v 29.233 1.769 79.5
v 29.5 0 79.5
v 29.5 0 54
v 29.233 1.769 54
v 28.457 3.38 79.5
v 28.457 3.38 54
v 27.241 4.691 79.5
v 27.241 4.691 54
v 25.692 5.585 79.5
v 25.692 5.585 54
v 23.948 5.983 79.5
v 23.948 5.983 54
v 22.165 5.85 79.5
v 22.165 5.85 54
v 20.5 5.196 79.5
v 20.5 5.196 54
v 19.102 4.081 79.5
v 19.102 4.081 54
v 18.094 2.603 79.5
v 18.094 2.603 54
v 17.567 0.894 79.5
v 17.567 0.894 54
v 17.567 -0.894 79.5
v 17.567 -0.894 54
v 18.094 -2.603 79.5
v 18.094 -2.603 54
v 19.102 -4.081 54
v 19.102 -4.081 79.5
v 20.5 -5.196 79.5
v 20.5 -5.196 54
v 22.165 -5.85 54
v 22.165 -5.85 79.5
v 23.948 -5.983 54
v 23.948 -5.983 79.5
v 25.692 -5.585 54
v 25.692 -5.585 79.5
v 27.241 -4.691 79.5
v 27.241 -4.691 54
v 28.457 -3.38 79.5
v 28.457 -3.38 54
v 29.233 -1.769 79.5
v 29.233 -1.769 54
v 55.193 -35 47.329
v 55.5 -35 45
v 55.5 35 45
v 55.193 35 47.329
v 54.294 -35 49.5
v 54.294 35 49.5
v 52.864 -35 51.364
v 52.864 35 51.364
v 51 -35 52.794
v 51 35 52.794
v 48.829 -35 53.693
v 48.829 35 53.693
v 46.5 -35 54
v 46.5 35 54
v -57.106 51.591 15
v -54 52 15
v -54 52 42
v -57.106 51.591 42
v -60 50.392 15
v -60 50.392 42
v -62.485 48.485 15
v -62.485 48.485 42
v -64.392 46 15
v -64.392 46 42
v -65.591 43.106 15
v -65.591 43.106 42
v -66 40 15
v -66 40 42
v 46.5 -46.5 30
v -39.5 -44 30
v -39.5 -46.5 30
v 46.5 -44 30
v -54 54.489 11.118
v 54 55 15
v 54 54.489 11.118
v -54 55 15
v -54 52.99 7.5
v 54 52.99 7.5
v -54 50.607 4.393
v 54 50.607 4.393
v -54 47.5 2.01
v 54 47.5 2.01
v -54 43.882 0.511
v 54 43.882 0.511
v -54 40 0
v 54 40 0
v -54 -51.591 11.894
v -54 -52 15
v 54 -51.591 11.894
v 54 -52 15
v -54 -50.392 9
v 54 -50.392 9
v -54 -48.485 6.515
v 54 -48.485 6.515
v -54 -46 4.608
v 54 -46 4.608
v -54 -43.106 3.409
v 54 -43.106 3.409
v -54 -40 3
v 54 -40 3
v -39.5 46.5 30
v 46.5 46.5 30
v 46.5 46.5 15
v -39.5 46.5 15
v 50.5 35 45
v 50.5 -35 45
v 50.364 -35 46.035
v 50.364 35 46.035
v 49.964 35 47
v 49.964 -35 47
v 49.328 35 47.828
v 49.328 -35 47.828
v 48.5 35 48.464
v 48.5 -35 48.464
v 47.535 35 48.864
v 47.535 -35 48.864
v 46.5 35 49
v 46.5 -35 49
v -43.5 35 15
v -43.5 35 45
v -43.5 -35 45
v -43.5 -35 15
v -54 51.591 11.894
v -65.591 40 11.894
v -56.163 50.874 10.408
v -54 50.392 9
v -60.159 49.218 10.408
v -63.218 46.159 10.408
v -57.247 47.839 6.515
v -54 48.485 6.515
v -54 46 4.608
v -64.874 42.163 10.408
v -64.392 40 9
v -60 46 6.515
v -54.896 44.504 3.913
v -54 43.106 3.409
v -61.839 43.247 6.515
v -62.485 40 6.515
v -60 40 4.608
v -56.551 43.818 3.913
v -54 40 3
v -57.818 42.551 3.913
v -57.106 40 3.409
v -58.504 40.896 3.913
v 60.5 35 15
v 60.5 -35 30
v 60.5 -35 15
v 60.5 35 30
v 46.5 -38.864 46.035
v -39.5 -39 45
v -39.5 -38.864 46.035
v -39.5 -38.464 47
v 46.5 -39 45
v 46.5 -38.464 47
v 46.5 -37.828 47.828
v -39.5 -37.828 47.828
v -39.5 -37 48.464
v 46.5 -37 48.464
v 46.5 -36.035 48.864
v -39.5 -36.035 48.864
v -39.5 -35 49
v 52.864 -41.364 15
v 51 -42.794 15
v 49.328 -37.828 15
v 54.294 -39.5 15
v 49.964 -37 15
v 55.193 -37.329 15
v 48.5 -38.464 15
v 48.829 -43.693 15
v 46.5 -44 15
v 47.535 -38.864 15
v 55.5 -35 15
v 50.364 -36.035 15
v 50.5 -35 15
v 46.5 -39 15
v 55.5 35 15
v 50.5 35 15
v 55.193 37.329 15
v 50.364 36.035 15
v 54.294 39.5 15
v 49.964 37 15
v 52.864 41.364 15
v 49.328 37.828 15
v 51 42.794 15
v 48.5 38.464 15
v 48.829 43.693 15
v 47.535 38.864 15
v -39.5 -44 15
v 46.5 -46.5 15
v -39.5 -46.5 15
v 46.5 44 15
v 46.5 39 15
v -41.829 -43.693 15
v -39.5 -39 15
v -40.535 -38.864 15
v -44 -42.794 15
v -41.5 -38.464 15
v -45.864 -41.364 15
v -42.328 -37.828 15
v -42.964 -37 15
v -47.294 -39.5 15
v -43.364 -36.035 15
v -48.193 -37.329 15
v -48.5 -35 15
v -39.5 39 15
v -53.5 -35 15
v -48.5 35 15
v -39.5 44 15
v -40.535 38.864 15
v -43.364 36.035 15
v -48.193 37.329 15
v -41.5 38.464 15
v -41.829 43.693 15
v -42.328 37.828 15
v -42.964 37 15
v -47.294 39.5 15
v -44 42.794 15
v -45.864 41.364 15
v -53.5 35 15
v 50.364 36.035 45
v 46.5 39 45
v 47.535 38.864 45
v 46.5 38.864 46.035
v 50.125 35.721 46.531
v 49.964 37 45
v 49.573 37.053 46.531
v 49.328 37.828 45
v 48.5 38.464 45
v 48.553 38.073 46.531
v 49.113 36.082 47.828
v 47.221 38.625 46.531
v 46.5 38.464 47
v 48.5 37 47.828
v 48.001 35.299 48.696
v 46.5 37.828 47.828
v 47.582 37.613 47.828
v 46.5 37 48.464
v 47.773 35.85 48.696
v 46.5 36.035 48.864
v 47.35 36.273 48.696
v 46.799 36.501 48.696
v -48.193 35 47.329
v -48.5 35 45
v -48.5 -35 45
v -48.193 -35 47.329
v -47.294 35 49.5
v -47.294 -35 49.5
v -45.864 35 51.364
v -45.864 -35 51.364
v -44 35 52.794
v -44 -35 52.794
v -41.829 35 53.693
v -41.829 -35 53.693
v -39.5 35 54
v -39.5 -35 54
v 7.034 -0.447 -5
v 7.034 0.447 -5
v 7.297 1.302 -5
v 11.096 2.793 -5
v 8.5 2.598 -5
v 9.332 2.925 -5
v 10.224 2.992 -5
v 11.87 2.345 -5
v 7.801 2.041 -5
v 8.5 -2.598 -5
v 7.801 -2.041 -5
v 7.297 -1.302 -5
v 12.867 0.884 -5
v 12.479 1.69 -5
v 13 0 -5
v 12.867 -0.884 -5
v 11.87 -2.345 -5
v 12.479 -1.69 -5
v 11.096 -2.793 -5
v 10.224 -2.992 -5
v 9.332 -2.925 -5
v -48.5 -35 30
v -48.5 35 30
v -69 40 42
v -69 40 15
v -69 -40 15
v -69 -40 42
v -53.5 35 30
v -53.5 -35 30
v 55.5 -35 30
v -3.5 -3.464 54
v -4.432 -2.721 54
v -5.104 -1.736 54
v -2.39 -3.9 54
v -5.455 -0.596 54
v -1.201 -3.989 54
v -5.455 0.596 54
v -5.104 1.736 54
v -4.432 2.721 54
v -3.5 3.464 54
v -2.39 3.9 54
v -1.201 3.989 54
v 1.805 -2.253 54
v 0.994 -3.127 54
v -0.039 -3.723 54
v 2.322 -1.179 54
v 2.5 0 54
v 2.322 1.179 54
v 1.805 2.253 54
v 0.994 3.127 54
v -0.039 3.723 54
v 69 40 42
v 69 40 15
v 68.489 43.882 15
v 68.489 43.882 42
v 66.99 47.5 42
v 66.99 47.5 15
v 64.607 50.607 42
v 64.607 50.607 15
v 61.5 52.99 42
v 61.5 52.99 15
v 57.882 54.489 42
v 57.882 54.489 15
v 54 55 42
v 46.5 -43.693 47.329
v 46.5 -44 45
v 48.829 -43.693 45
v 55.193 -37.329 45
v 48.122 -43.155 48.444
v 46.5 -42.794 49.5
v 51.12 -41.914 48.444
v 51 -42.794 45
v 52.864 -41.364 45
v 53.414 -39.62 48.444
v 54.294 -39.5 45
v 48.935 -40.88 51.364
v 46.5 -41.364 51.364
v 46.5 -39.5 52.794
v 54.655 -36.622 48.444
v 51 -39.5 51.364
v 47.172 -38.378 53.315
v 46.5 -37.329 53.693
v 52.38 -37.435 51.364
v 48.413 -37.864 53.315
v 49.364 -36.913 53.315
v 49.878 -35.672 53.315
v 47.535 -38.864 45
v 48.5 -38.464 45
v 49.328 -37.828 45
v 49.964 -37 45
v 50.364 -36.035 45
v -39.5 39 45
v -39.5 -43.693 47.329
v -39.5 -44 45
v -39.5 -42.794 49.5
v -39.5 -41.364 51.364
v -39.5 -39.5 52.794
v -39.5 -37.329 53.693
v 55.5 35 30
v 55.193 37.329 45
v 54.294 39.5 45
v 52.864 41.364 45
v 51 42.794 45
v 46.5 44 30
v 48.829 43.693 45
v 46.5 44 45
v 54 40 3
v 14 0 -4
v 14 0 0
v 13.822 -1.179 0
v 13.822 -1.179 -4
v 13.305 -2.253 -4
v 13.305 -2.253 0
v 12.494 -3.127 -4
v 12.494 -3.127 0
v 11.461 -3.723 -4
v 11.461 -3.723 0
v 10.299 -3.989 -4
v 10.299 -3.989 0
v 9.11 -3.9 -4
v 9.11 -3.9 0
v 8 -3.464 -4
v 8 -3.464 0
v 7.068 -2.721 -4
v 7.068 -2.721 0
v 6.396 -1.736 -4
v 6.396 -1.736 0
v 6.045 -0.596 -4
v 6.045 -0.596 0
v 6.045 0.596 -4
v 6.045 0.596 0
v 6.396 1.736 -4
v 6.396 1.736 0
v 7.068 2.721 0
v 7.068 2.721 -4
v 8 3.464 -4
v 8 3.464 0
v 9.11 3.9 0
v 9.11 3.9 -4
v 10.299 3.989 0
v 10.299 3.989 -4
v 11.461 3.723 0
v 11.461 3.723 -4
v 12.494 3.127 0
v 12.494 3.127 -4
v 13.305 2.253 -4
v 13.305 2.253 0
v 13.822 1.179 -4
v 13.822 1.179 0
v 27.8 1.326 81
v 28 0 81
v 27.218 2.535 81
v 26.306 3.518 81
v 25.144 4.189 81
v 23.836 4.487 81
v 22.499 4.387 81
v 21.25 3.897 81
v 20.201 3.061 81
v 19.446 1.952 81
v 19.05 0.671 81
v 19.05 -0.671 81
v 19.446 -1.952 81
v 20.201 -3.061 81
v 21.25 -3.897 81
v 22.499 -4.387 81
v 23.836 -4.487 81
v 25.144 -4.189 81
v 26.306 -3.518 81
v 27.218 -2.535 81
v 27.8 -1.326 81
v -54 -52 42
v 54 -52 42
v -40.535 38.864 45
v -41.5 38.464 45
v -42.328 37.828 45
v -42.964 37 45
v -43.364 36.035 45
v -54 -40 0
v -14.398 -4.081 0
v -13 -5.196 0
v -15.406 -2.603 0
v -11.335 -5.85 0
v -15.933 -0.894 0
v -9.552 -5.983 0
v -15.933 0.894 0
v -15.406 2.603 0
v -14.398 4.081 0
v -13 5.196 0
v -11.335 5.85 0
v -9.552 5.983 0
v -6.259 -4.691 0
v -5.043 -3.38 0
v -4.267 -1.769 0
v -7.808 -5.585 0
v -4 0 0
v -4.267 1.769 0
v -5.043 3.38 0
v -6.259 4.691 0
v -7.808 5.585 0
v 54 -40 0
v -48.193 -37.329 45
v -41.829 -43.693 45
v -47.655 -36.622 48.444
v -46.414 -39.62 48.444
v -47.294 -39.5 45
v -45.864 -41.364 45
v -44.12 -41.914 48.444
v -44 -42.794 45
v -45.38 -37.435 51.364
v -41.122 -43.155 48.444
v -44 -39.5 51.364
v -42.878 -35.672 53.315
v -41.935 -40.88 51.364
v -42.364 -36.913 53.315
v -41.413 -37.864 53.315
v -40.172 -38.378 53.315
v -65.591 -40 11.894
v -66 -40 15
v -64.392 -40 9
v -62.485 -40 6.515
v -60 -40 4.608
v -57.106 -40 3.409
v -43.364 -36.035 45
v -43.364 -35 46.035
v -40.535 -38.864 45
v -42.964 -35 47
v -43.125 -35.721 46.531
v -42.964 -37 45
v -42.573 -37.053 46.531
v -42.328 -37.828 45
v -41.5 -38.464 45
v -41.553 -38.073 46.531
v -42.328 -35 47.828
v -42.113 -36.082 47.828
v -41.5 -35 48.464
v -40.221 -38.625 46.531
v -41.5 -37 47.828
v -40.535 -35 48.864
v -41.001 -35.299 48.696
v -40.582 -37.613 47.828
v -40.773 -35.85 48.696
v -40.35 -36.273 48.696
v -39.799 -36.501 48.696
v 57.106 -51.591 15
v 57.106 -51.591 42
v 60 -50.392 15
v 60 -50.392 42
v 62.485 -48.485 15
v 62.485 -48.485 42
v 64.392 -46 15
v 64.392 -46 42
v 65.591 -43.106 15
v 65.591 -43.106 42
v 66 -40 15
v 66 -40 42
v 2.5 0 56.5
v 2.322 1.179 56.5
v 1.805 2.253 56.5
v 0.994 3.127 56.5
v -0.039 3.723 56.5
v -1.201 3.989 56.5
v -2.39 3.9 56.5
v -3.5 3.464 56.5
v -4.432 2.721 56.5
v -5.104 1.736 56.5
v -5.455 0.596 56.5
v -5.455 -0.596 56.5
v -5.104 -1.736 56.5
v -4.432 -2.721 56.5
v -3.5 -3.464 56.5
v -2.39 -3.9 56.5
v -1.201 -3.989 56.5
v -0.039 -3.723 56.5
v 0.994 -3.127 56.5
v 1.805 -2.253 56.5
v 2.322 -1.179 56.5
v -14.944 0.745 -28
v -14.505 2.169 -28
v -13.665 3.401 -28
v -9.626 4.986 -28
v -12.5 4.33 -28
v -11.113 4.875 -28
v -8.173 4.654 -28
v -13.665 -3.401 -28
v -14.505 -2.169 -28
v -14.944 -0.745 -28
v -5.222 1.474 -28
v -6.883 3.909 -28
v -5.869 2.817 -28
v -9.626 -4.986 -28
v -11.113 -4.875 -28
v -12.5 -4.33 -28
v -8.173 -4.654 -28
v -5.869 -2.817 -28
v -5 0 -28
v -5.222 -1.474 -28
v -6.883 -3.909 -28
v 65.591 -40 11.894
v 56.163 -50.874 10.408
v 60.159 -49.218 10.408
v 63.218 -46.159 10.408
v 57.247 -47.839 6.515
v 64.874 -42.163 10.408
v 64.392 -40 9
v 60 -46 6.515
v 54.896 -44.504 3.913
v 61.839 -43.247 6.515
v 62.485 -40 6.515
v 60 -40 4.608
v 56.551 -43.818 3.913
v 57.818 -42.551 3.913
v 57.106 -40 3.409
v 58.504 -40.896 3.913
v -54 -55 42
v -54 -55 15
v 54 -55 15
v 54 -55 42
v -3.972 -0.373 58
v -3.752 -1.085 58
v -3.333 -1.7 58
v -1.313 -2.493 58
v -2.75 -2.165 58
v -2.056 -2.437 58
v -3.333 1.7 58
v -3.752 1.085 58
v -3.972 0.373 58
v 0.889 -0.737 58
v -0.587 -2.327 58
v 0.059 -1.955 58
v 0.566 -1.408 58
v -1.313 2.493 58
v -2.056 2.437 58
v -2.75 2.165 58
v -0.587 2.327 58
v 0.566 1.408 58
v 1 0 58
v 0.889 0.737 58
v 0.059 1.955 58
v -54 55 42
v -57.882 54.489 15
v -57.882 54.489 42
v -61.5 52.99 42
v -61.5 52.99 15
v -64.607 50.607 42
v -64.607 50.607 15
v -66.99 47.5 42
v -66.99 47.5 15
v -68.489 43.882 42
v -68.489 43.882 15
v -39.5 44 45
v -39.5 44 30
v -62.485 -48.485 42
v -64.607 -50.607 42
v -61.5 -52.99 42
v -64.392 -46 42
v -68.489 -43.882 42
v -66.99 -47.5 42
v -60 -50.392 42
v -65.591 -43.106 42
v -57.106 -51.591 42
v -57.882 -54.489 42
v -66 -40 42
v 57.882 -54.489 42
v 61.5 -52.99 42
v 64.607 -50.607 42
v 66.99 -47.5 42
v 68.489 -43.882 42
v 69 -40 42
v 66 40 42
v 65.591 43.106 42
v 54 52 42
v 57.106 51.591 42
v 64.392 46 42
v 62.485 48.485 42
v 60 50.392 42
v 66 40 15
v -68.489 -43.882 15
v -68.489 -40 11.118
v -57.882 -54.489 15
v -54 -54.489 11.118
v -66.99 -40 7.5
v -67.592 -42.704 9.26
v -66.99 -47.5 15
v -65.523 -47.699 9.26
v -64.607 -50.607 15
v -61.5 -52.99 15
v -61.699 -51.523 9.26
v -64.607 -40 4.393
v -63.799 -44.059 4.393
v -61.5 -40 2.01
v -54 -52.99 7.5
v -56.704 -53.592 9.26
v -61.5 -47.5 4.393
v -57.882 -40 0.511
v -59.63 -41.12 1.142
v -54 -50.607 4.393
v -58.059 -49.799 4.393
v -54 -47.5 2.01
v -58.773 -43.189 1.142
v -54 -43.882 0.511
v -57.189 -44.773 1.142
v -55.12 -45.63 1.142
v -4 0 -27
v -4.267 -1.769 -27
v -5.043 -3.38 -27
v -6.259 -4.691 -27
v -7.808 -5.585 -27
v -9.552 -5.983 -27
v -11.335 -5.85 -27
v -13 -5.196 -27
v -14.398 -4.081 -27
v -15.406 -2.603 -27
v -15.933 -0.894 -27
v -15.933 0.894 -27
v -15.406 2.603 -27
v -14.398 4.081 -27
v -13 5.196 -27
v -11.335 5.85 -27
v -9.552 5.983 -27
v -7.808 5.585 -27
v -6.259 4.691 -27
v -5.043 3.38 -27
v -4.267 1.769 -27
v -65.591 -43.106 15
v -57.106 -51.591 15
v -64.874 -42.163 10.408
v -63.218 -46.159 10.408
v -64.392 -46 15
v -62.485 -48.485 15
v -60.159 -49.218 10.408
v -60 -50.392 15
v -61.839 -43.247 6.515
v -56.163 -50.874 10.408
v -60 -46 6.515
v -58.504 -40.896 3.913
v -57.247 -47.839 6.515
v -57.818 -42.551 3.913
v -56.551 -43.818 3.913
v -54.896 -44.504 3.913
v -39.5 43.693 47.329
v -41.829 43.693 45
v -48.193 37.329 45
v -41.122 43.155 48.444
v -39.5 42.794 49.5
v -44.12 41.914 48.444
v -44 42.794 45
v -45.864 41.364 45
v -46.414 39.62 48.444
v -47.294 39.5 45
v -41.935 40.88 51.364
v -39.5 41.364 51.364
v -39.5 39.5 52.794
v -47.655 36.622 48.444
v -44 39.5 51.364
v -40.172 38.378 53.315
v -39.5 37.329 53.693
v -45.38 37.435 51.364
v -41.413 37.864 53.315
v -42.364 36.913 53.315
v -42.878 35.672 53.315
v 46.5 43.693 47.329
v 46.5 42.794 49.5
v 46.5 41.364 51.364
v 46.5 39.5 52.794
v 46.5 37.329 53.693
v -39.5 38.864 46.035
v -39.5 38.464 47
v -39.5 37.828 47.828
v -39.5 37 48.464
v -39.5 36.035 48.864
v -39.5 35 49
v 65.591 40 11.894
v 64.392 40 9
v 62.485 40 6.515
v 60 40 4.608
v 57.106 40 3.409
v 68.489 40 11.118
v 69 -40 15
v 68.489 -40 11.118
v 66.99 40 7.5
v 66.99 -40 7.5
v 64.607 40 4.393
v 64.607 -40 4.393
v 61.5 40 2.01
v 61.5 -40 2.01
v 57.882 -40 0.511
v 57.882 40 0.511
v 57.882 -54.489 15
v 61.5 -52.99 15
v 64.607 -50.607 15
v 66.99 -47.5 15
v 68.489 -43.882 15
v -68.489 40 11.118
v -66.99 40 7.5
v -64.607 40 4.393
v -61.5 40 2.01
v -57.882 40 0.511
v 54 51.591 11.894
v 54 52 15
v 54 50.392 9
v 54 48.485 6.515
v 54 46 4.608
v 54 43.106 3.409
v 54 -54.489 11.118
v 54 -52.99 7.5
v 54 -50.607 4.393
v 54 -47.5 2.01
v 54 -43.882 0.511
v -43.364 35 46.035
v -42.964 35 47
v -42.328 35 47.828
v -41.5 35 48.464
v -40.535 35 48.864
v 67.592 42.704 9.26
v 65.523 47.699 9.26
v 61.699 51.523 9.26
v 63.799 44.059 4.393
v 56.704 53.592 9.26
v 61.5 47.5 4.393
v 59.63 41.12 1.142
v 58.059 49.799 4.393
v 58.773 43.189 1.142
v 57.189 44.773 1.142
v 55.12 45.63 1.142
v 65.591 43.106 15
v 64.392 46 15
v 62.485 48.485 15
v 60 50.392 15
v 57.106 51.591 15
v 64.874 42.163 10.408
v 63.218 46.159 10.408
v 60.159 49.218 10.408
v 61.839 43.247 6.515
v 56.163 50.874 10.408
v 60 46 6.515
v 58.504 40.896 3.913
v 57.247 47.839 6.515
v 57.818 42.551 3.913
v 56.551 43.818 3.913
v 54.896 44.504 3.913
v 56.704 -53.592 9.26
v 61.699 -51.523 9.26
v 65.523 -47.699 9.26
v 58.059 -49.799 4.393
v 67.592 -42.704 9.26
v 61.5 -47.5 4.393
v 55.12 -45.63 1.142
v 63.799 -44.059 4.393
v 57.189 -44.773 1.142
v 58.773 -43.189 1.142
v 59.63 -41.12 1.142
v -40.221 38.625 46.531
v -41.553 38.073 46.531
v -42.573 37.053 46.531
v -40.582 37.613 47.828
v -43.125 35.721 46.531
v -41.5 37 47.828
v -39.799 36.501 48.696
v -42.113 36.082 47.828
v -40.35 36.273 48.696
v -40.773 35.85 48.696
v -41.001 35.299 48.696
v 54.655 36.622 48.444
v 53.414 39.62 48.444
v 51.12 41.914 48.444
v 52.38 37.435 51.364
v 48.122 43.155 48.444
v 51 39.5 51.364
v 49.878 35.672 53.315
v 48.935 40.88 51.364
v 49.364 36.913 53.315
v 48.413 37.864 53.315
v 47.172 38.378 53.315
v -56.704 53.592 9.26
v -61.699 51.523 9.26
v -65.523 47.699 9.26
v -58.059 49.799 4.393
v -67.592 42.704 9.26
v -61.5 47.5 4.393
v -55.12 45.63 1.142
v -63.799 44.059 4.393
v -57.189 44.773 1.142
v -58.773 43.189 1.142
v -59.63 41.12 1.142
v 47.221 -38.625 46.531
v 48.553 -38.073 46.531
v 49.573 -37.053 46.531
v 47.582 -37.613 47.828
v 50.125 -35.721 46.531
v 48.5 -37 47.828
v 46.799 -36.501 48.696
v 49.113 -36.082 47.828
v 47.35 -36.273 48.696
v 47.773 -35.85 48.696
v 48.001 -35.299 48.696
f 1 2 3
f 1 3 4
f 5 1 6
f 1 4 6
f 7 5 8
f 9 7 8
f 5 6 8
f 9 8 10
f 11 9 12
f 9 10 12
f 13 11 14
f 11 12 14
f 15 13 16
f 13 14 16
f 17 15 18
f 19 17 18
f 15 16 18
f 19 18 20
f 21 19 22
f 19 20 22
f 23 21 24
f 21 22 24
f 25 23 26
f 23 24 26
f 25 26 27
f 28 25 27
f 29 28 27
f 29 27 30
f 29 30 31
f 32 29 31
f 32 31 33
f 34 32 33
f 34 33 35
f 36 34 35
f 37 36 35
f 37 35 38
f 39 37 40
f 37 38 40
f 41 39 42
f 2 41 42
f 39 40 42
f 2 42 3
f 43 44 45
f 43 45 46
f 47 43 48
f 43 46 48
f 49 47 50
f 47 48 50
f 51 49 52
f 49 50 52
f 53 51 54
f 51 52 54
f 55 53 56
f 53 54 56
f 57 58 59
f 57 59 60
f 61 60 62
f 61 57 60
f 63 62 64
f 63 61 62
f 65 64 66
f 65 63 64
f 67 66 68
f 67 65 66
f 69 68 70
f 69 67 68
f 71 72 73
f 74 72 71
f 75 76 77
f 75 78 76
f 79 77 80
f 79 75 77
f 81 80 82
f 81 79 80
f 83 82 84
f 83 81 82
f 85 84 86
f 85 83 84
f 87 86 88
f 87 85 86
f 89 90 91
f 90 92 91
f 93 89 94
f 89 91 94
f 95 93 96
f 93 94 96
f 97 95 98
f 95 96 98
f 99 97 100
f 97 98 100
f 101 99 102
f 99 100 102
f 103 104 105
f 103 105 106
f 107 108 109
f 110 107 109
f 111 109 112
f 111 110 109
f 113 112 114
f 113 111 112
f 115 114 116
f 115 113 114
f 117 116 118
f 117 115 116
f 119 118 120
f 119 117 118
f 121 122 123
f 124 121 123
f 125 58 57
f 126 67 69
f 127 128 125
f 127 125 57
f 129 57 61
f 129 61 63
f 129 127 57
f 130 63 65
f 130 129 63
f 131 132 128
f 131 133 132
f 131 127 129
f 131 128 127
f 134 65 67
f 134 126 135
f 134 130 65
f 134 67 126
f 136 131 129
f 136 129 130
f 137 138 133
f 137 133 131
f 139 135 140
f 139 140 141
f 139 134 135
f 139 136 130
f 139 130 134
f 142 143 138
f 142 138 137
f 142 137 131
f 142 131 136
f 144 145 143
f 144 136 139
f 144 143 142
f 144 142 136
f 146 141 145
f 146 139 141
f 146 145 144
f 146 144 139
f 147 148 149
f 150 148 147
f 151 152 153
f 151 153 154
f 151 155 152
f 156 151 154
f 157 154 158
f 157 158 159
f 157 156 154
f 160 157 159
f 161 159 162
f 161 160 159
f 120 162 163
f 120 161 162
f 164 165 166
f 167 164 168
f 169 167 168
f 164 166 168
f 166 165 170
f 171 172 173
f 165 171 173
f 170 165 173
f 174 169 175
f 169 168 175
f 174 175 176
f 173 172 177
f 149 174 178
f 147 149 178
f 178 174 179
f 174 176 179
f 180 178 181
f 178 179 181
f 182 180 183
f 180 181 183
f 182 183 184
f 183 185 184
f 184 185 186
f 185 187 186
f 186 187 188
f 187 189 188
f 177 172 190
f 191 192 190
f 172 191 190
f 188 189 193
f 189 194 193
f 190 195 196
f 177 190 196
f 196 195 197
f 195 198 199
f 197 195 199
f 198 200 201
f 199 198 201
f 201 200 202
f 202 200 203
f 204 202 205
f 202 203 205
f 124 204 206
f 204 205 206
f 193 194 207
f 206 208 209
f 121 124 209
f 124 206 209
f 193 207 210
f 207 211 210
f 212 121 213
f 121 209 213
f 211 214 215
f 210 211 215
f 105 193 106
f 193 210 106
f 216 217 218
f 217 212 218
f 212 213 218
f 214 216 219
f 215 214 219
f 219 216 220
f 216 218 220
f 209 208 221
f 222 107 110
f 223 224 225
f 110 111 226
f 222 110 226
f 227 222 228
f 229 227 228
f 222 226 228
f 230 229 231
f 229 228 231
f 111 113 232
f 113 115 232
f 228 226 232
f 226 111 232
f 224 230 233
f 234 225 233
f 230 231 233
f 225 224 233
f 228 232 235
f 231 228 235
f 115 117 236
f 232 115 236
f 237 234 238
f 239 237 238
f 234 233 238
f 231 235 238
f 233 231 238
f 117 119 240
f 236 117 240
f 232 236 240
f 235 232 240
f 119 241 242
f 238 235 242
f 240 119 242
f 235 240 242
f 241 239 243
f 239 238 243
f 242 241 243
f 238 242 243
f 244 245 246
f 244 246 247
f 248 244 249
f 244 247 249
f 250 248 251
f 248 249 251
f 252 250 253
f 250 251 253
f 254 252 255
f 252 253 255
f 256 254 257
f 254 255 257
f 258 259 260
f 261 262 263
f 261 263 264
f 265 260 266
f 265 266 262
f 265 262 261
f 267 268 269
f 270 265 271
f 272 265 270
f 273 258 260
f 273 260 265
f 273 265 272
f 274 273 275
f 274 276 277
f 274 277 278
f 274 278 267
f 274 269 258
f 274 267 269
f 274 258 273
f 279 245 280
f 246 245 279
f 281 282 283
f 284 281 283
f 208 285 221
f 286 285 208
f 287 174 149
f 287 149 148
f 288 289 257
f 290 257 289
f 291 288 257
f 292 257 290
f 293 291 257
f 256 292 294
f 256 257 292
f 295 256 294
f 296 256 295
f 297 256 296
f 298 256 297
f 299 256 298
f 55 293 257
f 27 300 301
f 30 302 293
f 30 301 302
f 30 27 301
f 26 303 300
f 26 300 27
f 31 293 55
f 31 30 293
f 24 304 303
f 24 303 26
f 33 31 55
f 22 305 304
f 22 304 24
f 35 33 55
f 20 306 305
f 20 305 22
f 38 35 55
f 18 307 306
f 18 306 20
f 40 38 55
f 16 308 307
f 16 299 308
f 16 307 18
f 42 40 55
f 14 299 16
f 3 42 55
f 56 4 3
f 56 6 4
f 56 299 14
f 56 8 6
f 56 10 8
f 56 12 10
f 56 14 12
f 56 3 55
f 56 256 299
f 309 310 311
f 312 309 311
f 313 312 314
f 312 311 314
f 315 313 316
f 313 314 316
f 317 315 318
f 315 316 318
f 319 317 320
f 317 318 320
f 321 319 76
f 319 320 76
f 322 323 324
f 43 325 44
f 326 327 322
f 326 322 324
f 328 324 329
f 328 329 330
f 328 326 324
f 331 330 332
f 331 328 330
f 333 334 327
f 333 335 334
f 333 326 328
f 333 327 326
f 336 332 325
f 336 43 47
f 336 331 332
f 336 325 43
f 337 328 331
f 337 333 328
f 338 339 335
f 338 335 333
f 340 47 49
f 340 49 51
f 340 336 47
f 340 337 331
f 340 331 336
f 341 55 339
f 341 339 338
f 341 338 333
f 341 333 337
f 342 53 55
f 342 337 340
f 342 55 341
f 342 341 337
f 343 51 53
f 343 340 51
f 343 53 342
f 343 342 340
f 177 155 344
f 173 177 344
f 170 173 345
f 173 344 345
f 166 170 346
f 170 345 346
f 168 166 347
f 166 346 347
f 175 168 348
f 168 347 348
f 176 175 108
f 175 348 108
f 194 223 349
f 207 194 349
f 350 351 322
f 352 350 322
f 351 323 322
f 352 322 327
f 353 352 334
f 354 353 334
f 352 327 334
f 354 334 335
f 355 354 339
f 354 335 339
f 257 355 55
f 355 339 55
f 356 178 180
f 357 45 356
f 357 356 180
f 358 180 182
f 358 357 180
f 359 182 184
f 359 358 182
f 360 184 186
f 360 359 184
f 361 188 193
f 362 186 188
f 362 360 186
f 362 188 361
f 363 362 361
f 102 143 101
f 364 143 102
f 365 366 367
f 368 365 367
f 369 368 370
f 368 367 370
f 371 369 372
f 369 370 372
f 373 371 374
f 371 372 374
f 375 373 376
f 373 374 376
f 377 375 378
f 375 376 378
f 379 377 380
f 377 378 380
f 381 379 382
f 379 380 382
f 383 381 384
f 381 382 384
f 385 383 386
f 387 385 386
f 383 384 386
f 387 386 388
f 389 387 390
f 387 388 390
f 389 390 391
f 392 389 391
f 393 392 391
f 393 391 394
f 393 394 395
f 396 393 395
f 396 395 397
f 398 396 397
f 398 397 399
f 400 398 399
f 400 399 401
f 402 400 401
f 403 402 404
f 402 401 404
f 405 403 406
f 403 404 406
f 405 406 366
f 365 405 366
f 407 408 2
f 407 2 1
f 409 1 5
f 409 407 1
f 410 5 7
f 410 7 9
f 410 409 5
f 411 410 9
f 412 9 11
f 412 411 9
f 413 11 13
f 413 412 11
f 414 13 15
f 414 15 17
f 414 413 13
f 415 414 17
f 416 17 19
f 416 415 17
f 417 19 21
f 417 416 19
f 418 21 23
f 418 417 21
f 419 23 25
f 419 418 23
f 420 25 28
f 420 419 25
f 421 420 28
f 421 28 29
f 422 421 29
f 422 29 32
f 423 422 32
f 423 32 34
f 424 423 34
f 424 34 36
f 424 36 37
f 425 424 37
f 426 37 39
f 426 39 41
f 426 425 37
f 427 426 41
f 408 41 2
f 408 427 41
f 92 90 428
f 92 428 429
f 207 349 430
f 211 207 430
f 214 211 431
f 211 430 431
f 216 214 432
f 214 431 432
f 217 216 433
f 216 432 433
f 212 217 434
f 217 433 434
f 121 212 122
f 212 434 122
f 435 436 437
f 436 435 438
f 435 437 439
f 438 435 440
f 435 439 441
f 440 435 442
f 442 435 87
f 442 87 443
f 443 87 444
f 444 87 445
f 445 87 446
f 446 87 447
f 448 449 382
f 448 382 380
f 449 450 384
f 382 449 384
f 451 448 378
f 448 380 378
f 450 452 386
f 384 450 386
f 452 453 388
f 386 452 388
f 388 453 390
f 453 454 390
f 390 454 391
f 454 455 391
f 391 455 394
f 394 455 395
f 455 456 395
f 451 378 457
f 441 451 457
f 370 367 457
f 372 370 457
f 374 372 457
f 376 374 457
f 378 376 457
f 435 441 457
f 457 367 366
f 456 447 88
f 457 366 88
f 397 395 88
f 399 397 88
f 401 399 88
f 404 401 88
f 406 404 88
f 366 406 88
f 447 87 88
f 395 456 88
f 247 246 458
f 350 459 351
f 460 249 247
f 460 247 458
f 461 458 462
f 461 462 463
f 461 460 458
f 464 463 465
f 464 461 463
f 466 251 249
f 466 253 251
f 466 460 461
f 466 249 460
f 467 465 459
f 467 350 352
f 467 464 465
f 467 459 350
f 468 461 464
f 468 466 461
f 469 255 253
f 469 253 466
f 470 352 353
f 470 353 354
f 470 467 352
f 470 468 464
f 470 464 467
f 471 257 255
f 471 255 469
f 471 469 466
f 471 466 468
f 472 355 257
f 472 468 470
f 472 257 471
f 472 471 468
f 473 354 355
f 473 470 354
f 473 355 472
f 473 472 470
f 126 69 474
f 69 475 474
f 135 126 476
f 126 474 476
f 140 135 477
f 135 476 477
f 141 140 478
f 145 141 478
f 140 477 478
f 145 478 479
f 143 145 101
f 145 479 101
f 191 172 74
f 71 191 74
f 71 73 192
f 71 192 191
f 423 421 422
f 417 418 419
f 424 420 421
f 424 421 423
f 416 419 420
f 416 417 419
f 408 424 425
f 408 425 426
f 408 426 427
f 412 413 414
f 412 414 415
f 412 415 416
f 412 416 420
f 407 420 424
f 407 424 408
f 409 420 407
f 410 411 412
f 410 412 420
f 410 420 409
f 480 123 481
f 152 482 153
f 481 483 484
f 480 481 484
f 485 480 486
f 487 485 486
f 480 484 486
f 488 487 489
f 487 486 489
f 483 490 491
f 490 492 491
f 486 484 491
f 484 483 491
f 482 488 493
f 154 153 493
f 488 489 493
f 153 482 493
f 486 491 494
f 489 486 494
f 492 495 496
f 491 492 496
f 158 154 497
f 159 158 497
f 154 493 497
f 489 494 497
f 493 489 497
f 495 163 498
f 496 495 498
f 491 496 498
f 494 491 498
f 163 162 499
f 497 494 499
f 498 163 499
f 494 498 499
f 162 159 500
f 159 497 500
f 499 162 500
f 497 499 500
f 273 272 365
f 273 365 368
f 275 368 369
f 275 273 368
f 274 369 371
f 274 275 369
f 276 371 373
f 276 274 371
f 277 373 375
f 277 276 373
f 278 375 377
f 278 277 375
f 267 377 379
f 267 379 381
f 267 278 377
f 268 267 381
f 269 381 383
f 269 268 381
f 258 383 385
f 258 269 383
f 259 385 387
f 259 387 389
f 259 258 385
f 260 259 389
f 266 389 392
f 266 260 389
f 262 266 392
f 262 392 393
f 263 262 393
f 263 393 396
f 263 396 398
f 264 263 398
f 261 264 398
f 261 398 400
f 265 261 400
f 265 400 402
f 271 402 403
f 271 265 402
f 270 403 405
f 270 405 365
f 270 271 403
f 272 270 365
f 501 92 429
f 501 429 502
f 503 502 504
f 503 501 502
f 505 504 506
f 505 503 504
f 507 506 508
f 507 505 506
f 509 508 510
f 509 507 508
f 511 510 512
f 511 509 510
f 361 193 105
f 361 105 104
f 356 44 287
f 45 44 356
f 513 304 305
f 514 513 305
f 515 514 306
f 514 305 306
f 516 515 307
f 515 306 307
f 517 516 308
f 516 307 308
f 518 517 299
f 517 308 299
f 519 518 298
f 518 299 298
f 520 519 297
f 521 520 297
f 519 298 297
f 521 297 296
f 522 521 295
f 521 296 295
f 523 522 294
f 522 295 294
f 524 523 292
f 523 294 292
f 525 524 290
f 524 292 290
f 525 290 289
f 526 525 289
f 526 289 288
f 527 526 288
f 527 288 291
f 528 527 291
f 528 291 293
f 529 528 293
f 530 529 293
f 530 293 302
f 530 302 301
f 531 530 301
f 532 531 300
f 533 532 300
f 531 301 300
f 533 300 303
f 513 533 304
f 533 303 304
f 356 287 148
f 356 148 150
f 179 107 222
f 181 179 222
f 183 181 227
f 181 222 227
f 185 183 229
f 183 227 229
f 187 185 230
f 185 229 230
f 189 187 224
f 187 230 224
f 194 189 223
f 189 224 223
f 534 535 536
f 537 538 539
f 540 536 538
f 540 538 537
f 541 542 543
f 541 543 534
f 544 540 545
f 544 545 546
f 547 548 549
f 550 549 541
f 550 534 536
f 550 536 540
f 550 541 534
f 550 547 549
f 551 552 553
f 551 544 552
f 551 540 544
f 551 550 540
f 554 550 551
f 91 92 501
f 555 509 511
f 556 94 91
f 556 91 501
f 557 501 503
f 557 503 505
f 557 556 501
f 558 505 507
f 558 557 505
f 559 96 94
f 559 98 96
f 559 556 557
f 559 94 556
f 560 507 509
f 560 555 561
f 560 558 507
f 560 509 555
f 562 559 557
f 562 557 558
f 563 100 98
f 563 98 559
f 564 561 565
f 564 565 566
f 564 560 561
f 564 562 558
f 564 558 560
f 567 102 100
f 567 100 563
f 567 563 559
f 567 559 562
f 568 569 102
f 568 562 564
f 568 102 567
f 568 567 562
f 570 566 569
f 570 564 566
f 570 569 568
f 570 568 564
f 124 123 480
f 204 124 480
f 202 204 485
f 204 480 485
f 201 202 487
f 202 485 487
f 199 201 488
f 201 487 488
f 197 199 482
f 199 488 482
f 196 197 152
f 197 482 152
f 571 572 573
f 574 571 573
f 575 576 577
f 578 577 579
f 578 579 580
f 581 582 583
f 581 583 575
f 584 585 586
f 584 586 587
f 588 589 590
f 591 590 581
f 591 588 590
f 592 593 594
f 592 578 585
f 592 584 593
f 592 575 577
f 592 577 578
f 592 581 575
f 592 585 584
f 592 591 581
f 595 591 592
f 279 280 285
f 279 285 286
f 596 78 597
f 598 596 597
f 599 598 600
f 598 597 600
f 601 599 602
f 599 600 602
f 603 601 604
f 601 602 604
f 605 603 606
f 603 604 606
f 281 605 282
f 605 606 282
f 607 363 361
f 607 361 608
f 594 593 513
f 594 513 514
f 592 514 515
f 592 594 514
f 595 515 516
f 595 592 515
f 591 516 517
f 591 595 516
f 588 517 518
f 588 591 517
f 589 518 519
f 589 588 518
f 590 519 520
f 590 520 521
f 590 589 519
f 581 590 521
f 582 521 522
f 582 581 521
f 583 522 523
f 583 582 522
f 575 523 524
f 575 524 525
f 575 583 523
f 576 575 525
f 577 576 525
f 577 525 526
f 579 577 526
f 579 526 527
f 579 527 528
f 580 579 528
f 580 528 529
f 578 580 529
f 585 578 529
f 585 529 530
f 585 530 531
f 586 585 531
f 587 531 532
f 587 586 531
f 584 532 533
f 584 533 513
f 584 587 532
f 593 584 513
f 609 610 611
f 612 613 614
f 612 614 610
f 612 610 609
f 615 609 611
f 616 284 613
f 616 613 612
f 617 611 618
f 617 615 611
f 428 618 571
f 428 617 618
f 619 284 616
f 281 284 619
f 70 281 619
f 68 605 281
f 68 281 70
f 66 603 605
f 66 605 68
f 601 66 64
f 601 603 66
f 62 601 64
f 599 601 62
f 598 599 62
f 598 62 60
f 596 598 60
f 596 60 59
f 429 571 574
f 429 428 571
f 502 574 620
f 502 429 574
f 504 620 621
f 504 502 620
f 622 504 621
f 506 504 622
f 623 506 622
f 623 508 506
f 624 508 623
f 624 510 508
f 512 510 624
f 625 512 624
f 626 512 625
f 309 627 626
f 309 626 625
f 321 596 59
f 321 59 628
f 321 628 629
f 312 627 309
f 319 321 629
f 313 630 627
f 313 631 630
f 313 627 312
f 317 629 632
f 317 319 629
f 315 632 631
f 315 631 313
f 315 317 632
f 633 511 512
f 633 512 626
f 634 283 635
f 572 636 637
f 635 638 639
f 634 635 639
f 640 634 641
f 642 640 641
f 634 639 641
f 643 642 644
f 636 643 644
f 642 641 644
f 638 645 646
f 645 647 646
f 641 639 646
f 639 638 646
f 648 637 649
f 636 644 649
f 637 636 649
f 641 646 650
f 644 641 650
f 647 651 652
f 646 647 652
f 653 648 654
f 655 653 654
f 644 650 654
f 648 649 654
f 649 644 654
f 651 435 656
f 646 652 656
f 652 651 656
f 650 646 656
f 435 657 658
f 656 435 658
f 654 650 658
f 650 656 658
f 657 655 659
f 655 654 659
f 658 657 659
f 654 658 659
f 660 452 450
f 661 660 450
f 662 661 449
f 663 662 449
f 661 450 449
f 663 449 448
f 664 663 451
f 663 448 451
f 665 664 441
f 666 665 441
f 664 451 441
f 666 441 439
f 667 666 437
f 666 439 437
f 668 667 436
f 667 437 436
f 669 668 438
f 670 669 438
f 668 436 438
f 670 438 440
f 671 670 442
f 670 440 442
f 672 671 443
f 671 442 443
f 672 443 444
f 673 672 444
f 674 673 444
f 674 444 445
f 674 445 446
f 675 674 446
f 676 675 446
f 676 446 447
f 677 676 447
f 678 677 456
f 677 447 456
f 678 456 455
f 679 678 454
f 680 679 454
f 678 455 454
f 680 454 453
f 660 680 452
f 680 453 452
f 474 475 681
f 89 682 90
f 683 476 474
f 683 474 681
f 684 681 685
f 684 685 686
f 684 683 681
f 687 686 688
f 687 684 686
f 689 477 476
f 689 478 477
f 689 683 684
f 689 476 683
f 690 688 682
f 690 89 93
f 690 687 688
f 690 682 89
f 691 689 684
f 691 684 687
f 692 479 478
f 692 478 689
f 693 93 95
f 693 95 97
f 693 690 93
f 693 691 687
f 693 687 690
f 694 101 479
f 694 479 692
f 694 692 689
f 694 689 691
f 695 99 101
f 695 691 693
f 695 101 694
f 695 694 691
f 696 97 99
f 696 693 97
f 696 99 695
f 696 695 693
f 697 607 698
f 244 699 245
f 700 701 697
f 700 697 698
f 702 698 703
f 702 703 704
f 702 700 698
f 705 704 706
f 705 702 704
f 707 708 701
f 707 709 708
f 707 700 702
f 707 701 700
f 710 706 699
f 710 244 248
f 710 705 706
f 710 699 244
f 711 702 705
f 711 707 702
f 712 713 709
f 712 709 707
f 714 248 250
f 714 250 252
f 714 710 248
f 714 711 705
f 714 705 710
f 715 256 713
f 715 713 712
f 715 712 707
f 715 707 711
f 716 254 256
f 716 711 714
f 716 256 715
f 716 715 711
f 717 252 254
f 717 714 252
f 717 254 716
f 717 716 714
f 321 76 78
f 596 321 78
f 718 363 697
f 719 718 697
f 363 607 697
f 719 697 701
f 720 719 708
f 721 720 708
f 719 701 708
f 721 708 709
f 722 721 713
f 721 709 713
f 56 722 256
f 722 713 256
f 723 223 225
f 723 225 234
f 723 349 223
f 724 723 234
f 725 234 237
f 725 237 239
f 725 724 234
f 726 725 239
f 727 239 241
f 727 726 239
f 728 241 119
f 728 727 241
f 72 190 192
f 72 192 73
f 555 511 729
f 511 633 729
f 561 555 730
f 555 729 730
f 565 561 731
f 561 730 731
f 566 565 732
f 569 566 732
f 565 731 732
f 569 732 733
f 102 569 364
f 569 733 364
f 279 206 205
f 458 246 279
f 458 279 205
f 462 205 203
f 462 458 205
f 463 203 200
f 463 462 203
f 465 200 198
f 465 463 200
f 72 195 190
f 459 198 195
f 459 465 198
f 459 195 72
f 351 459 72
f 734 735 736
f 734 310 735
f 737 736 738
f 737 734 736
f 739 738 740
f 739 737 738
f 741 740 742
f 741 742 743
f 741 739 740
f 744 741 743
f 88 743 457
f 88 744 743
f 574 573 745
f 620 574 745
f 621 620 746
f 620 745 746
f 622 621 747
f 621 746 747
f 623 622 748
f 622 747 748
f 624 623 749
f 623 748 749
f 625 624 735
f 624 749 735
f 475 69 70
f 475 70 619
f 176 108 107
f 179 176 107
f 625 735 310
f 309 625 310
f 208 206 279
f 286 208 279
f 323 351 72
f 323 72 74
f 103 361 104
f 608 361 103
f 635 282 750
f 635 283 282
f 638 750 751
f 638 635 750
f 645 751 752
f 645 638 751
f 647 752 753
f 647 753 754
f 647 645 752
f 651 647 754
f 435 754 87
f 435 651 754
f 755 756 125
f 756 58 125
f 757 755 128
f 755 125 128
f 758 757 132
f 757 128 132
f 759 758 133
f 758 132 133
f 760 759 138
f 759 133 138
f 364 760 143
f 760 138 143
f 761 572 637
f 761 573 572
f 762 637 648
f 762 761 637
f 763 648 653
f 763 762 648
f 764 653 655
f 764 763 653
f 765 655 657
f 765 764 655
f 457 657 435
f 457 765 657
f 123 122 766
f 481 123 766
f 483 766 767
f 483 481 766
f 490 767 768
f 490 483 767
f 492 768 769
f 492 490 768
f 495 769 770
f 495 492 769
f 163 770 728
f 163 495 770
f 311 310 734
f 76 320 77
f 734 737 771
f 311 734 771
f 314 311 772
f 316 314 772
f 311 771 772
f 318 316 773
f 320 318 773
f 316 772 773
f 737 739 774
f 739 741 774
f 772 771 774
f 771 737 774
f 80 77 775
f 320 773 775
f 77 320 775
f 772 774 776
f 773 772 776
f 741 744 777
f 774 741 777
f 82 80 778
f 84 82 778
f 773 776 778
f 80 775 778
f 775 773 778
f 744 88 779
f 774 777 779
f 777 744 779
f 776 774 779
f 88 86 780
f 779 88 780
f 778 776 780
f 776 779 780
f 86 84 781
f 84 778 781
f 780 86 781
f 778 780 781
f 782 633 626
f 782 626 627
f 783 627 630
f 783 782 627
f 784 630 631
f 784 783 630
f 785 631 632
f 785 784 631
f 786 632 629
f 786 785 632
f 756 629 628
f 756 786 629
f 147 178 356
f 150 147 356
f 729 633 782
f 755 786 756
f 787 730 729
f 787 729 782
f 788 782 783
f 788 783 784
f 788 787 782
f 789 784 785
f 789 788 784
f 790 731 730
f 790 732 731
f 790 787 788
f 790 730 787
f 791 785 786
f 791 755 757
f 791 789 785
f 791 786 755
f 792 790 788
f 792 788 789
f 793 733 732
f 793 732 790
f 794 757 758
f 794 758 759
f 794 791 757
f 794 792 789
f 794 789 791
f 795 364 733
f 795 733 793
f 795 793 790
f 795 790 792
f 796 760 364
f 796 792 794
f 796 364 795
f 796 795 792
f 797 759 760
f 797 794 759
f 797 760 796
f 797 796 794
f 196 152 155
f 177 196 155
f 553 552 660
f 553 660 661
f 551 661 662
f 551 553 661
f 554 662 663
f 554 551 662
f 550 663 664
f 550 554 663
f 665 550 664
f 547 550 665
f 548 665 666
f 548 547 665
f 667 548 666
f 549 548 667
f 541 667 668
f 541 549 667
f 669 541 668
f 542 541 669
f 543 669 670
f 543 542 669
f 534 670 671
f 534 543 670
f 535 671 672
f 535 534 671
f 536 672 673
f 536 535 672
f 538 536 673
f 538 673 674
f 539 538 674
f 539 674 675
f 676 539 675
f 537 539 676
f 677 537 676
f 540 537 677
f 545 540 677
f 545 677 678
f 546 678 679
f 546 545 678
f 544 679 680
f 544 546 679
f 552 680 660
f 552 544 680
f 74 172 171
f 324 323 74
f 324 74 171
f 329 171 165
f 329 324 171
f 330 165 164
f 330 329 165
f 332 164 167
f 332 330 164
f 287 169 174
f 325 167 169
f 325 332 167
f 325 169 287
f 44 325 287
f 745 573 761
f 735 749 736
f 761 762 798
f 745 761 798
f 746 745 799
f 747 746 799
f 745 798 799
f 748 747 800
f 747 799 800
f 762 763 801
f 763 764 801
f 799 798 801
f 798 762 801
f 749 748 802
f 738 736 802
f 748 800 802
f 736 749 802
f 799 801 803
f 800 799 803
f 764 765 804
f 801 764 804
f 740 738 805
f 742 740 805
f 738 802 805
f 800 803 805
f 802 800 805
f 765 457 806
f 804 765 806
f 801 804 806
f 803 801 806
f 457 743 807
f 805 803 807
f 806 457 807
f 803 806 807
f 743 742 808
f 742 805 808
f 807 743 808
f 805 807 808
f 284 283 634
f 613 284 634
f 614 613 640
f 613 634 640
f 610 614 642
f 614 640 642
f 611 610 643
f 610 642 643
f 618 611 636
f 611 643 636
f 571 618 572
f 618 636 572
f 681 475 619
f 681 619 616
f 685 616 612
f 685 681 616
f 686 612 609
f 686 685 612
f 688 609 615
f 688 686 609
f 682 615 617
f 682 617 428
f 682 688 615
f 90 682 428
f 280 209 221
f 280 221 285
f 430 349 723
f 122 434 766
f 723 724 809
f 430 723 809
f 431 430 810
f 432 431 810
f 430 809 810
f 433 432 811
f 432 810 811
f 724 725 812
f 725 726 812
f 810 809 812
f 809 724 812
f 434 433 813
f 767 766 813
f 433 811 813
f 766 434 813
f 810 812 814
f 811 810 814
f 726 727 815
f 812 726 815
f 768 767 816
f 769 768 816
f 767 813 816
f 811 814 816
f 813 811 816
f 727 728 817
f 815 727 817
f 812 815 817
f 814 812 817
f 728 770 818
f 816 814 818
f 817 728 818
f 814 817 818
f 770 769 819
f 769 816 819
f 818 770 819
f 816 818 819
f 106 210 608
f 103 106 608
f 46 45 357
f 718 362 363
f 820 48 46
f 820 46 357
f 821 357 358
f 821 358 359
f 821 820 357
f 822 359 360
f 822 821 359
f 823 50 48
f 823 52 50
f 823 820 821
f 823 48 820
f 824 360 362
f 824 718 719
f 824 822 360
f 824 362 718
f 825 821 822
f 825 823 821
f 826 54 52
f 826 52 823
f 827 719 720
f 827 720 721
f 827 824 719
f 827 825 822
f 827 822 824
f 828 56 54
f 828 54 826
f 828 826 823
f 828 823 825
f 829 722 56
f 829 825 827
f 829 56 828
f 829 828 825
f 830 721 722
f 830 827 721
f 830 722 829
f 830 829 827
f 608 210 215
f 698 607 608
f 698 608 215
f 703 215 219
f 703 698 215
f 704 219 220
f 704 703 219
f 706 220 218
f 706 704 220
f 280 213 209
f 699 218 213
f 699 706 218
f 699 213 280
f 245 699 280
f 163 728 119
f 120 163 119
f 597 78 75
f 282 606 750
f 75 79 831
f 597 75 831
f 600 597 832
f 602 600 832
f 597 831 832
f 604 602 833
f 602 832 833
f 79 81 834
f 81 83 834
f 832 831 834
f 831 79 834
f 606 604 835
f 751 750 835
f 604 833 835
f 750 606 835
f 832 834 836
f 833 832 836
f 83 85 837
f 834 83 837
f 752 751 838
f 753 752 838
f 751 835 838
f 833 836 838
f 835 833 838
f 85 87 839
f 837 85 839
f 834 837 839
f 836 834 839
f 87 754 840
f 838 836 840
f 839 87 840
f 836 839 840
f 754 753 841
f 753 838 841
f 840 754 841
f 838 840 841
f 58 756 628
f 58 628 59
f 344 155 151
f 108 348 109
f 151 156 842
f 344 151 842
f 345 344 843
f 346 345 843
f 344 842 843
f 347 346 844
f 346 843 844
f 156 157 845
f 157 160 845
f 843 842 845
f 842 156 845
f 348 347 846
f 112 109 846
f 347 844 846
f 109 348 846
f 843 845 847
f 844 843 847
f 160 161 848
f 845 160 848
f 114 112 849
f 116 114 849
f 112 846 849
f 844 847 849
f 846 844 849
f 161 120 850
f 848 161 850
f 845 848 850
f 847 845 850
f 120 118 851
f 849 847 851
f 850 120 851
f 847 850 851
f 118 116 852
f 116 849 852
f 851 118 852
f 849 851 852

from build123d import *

# Parameters (mm, degrees)
F1_DEPTH  = 42
F2_R      = 15
F3_T      = -3
F4_R      = 6
F5_DEPTH  = 28
F4_R_2    = 4
F6_DEPTH  = 5
F7_SIZE   = 1
F10_DEPTH = 39
F11_R     = 9
F12_T     = -5
F13_W     = 86
F13_H     = 15
F14_DEPTH = 2.5
F15_W     = 86
F15_H     = 15
F16_DEPTH = 2.5
F17_W     = 70
F17_H     = 15
F18_DEPTH = 5
F19_W     = 70
F19_H     = 15
F20_DEPTH = 5
F21_R     = 6
F22_DEPTH = 27
F21_R_2   = 4
F23_DEPTH = 4
F24_SIZE  = 1.5


with BuildPart() as f1:
    # F0 (on Top) → F1 (new body)
    with BuildSketch(Plane.XY):
        with BuildLine():
            Line((-54, -55), (54, -55))
            ThreePointArc((54, -55), (64.6066017178, -50.6066017178), (69, -40))
            Line((69, -40), (69, 40))
            ThreePointArc((69, 40), (64.6066017178, 50.6066017178), (54, 55))
            Line((54, 55), (-54, 55))
            ThreePointArc((-54, 55), (-64.6066017178, 50.6066017178), (-69, 40))
            Line((-69, 40), (-69, -40))
            ThreePointArc((-69, -40), (-64.6066017178, -50.6066017178), (-54, -55))
        make_face()
    extrude(amount=F1_DEPTH)

    # F2
    f2_edges = [f1.edges().sort_by_distance(p)[0] for p in [
        (0, -55, 0),
    ]]
    fillet(f2_edges, radius=F2_R)

    # F3
    f3_openings = [f1.faces().sort_by_distance(p)[0] for p in [
        (0, 0, 42),
    ]]
    offset(amount=F3_T, openings=f3_openings)

    # F4 (on face) → F5 (join)
    with BuildSketch(Plane(origin=(0, 0, 0), x_dir=(1, 0, 0), z_dir=(0, 0, -1))):
        with Locations((-10, 0)):
            Circle(F4_R)
    extrude(amount=F5_DEPTH)

    # F4 (on face) → F6 (join)
    with BuildSketch(Plane(origin=(0, 0, 0), x_dir=(1, 0, 0), z_dir=(0, 0, -1))):
        with Locations((10, 0)):
            Circle(F4_R_2)
    extrude(amount=F6_DEPTH)

    # F7
    f7_edges = [f1.edges().sort_by_distance(p)[0] for p in [
        (6, 0, -5),
        (-16, 0, -28),
    ]]
    chamfer(f7_edges, length=F7_SIZE)


with BuildPart() as f10:
    # F9 (on offset) → F10 (new body)
    with BuildSketch(Plane.XY.offset(54)):
        with BuildLine():
            ThreePointArc((-48.5, -35), (-45.8639610307, -41.3639610307), (-39.5, -44))
            Line((-39.5, -44), (46.5, -44))
            ThreePointArc((46.5, -44), (52.8639610307, -41.3639610307), (55.5, -35))
            Line((55.5, -35), (55.5, 35))
            ThreePointArc((55.5, 35), (52.8639610307, 41.3639610307), (46.5, 44))
            Line((46.5, 44), (-39.5, 44))
            ThreePointArc((-39.5, 44), (-45.8639610307, 41.3639610307), (-48.5, 35))
            Line((-48.5, 35), (-48.5, -35))
        make_face()
    extrude(amount=-F10_DEPTH)

    # F11
    f11_edges = [f10.edges().sort_by_distance(p)[0] for p in [
        (-48.5, 0, 54),
    ]]
    fillet(f11_edges, radius=F11_R)

    # F12
    f12_openings = [f10.faces().sort_by_distance(p)[0] for p in [
        (3.5, 0, 15),
    ]]
    offset(amount=F12_T, openings=f12_openings)

    # F13 (on face) → F14 (join)
    with BuildSketch(Plane.XZ.offset(44)):
        with Locations((3.5, 22.5)):
            Rectangle(F13_W, F13_H)
    extrude(amount=F14_DEPTH)

    # F15 (on face) → F16 (join)
    with BuildSketch(Plane(origin=(0, 44, 0), x_dir=(-1, 0, 0), z_dir=(0, 1, 0))):
        with Locations((-3.5, 22.5)):
            Rectangle(F15_W, F15_H)
    extrude(amount=F16_DEPTH)

    # F17 (on face) → F18 (join)
    with BuildSketch(Plane(origin=(-48.5, 0, 0), x_dir=(0, -1, 0), z_dir=(-1, 0, 0))):
        with Locations((0, 22.5)):
            Rectangle(F17_W, F17_H)
    extrude(amount=F18_DEPTH)

    # F19 (on face) → F20 (join)
    with BuildSketch(Plane.YZ.offset(55.5)):
        with Locations((0, 22.5)):
            Rectangle(F19_W, F19_H)
    extrude(amount=F20_DEPTH)

    # F21 (on face) → F22 (join)
    with BuildSketch(Plane.XY.offset(54)):
        with Locations((23.5, 0)):
            Circle(F21_R)
    extrude(amount=F22_DEPTH)

    # F21 (on face) → F23 (join)
    with BuildSketch(Plane.XY.offset(54)):
        with Locations((-1.5, 0)):
            Circle(F21_R_2)
    extrude(amount=F23_DEPTH)

    # F24
    f24_edges = [f10.edges().sort_by_distance(p)[0] for p in [
        (17.5, 0, 81),
        (-5.5, 0, 58),
    ]]
    chamfer(f24_edges, length=F24_SIZE)


solid = Compound([f1.part, f10.part])
